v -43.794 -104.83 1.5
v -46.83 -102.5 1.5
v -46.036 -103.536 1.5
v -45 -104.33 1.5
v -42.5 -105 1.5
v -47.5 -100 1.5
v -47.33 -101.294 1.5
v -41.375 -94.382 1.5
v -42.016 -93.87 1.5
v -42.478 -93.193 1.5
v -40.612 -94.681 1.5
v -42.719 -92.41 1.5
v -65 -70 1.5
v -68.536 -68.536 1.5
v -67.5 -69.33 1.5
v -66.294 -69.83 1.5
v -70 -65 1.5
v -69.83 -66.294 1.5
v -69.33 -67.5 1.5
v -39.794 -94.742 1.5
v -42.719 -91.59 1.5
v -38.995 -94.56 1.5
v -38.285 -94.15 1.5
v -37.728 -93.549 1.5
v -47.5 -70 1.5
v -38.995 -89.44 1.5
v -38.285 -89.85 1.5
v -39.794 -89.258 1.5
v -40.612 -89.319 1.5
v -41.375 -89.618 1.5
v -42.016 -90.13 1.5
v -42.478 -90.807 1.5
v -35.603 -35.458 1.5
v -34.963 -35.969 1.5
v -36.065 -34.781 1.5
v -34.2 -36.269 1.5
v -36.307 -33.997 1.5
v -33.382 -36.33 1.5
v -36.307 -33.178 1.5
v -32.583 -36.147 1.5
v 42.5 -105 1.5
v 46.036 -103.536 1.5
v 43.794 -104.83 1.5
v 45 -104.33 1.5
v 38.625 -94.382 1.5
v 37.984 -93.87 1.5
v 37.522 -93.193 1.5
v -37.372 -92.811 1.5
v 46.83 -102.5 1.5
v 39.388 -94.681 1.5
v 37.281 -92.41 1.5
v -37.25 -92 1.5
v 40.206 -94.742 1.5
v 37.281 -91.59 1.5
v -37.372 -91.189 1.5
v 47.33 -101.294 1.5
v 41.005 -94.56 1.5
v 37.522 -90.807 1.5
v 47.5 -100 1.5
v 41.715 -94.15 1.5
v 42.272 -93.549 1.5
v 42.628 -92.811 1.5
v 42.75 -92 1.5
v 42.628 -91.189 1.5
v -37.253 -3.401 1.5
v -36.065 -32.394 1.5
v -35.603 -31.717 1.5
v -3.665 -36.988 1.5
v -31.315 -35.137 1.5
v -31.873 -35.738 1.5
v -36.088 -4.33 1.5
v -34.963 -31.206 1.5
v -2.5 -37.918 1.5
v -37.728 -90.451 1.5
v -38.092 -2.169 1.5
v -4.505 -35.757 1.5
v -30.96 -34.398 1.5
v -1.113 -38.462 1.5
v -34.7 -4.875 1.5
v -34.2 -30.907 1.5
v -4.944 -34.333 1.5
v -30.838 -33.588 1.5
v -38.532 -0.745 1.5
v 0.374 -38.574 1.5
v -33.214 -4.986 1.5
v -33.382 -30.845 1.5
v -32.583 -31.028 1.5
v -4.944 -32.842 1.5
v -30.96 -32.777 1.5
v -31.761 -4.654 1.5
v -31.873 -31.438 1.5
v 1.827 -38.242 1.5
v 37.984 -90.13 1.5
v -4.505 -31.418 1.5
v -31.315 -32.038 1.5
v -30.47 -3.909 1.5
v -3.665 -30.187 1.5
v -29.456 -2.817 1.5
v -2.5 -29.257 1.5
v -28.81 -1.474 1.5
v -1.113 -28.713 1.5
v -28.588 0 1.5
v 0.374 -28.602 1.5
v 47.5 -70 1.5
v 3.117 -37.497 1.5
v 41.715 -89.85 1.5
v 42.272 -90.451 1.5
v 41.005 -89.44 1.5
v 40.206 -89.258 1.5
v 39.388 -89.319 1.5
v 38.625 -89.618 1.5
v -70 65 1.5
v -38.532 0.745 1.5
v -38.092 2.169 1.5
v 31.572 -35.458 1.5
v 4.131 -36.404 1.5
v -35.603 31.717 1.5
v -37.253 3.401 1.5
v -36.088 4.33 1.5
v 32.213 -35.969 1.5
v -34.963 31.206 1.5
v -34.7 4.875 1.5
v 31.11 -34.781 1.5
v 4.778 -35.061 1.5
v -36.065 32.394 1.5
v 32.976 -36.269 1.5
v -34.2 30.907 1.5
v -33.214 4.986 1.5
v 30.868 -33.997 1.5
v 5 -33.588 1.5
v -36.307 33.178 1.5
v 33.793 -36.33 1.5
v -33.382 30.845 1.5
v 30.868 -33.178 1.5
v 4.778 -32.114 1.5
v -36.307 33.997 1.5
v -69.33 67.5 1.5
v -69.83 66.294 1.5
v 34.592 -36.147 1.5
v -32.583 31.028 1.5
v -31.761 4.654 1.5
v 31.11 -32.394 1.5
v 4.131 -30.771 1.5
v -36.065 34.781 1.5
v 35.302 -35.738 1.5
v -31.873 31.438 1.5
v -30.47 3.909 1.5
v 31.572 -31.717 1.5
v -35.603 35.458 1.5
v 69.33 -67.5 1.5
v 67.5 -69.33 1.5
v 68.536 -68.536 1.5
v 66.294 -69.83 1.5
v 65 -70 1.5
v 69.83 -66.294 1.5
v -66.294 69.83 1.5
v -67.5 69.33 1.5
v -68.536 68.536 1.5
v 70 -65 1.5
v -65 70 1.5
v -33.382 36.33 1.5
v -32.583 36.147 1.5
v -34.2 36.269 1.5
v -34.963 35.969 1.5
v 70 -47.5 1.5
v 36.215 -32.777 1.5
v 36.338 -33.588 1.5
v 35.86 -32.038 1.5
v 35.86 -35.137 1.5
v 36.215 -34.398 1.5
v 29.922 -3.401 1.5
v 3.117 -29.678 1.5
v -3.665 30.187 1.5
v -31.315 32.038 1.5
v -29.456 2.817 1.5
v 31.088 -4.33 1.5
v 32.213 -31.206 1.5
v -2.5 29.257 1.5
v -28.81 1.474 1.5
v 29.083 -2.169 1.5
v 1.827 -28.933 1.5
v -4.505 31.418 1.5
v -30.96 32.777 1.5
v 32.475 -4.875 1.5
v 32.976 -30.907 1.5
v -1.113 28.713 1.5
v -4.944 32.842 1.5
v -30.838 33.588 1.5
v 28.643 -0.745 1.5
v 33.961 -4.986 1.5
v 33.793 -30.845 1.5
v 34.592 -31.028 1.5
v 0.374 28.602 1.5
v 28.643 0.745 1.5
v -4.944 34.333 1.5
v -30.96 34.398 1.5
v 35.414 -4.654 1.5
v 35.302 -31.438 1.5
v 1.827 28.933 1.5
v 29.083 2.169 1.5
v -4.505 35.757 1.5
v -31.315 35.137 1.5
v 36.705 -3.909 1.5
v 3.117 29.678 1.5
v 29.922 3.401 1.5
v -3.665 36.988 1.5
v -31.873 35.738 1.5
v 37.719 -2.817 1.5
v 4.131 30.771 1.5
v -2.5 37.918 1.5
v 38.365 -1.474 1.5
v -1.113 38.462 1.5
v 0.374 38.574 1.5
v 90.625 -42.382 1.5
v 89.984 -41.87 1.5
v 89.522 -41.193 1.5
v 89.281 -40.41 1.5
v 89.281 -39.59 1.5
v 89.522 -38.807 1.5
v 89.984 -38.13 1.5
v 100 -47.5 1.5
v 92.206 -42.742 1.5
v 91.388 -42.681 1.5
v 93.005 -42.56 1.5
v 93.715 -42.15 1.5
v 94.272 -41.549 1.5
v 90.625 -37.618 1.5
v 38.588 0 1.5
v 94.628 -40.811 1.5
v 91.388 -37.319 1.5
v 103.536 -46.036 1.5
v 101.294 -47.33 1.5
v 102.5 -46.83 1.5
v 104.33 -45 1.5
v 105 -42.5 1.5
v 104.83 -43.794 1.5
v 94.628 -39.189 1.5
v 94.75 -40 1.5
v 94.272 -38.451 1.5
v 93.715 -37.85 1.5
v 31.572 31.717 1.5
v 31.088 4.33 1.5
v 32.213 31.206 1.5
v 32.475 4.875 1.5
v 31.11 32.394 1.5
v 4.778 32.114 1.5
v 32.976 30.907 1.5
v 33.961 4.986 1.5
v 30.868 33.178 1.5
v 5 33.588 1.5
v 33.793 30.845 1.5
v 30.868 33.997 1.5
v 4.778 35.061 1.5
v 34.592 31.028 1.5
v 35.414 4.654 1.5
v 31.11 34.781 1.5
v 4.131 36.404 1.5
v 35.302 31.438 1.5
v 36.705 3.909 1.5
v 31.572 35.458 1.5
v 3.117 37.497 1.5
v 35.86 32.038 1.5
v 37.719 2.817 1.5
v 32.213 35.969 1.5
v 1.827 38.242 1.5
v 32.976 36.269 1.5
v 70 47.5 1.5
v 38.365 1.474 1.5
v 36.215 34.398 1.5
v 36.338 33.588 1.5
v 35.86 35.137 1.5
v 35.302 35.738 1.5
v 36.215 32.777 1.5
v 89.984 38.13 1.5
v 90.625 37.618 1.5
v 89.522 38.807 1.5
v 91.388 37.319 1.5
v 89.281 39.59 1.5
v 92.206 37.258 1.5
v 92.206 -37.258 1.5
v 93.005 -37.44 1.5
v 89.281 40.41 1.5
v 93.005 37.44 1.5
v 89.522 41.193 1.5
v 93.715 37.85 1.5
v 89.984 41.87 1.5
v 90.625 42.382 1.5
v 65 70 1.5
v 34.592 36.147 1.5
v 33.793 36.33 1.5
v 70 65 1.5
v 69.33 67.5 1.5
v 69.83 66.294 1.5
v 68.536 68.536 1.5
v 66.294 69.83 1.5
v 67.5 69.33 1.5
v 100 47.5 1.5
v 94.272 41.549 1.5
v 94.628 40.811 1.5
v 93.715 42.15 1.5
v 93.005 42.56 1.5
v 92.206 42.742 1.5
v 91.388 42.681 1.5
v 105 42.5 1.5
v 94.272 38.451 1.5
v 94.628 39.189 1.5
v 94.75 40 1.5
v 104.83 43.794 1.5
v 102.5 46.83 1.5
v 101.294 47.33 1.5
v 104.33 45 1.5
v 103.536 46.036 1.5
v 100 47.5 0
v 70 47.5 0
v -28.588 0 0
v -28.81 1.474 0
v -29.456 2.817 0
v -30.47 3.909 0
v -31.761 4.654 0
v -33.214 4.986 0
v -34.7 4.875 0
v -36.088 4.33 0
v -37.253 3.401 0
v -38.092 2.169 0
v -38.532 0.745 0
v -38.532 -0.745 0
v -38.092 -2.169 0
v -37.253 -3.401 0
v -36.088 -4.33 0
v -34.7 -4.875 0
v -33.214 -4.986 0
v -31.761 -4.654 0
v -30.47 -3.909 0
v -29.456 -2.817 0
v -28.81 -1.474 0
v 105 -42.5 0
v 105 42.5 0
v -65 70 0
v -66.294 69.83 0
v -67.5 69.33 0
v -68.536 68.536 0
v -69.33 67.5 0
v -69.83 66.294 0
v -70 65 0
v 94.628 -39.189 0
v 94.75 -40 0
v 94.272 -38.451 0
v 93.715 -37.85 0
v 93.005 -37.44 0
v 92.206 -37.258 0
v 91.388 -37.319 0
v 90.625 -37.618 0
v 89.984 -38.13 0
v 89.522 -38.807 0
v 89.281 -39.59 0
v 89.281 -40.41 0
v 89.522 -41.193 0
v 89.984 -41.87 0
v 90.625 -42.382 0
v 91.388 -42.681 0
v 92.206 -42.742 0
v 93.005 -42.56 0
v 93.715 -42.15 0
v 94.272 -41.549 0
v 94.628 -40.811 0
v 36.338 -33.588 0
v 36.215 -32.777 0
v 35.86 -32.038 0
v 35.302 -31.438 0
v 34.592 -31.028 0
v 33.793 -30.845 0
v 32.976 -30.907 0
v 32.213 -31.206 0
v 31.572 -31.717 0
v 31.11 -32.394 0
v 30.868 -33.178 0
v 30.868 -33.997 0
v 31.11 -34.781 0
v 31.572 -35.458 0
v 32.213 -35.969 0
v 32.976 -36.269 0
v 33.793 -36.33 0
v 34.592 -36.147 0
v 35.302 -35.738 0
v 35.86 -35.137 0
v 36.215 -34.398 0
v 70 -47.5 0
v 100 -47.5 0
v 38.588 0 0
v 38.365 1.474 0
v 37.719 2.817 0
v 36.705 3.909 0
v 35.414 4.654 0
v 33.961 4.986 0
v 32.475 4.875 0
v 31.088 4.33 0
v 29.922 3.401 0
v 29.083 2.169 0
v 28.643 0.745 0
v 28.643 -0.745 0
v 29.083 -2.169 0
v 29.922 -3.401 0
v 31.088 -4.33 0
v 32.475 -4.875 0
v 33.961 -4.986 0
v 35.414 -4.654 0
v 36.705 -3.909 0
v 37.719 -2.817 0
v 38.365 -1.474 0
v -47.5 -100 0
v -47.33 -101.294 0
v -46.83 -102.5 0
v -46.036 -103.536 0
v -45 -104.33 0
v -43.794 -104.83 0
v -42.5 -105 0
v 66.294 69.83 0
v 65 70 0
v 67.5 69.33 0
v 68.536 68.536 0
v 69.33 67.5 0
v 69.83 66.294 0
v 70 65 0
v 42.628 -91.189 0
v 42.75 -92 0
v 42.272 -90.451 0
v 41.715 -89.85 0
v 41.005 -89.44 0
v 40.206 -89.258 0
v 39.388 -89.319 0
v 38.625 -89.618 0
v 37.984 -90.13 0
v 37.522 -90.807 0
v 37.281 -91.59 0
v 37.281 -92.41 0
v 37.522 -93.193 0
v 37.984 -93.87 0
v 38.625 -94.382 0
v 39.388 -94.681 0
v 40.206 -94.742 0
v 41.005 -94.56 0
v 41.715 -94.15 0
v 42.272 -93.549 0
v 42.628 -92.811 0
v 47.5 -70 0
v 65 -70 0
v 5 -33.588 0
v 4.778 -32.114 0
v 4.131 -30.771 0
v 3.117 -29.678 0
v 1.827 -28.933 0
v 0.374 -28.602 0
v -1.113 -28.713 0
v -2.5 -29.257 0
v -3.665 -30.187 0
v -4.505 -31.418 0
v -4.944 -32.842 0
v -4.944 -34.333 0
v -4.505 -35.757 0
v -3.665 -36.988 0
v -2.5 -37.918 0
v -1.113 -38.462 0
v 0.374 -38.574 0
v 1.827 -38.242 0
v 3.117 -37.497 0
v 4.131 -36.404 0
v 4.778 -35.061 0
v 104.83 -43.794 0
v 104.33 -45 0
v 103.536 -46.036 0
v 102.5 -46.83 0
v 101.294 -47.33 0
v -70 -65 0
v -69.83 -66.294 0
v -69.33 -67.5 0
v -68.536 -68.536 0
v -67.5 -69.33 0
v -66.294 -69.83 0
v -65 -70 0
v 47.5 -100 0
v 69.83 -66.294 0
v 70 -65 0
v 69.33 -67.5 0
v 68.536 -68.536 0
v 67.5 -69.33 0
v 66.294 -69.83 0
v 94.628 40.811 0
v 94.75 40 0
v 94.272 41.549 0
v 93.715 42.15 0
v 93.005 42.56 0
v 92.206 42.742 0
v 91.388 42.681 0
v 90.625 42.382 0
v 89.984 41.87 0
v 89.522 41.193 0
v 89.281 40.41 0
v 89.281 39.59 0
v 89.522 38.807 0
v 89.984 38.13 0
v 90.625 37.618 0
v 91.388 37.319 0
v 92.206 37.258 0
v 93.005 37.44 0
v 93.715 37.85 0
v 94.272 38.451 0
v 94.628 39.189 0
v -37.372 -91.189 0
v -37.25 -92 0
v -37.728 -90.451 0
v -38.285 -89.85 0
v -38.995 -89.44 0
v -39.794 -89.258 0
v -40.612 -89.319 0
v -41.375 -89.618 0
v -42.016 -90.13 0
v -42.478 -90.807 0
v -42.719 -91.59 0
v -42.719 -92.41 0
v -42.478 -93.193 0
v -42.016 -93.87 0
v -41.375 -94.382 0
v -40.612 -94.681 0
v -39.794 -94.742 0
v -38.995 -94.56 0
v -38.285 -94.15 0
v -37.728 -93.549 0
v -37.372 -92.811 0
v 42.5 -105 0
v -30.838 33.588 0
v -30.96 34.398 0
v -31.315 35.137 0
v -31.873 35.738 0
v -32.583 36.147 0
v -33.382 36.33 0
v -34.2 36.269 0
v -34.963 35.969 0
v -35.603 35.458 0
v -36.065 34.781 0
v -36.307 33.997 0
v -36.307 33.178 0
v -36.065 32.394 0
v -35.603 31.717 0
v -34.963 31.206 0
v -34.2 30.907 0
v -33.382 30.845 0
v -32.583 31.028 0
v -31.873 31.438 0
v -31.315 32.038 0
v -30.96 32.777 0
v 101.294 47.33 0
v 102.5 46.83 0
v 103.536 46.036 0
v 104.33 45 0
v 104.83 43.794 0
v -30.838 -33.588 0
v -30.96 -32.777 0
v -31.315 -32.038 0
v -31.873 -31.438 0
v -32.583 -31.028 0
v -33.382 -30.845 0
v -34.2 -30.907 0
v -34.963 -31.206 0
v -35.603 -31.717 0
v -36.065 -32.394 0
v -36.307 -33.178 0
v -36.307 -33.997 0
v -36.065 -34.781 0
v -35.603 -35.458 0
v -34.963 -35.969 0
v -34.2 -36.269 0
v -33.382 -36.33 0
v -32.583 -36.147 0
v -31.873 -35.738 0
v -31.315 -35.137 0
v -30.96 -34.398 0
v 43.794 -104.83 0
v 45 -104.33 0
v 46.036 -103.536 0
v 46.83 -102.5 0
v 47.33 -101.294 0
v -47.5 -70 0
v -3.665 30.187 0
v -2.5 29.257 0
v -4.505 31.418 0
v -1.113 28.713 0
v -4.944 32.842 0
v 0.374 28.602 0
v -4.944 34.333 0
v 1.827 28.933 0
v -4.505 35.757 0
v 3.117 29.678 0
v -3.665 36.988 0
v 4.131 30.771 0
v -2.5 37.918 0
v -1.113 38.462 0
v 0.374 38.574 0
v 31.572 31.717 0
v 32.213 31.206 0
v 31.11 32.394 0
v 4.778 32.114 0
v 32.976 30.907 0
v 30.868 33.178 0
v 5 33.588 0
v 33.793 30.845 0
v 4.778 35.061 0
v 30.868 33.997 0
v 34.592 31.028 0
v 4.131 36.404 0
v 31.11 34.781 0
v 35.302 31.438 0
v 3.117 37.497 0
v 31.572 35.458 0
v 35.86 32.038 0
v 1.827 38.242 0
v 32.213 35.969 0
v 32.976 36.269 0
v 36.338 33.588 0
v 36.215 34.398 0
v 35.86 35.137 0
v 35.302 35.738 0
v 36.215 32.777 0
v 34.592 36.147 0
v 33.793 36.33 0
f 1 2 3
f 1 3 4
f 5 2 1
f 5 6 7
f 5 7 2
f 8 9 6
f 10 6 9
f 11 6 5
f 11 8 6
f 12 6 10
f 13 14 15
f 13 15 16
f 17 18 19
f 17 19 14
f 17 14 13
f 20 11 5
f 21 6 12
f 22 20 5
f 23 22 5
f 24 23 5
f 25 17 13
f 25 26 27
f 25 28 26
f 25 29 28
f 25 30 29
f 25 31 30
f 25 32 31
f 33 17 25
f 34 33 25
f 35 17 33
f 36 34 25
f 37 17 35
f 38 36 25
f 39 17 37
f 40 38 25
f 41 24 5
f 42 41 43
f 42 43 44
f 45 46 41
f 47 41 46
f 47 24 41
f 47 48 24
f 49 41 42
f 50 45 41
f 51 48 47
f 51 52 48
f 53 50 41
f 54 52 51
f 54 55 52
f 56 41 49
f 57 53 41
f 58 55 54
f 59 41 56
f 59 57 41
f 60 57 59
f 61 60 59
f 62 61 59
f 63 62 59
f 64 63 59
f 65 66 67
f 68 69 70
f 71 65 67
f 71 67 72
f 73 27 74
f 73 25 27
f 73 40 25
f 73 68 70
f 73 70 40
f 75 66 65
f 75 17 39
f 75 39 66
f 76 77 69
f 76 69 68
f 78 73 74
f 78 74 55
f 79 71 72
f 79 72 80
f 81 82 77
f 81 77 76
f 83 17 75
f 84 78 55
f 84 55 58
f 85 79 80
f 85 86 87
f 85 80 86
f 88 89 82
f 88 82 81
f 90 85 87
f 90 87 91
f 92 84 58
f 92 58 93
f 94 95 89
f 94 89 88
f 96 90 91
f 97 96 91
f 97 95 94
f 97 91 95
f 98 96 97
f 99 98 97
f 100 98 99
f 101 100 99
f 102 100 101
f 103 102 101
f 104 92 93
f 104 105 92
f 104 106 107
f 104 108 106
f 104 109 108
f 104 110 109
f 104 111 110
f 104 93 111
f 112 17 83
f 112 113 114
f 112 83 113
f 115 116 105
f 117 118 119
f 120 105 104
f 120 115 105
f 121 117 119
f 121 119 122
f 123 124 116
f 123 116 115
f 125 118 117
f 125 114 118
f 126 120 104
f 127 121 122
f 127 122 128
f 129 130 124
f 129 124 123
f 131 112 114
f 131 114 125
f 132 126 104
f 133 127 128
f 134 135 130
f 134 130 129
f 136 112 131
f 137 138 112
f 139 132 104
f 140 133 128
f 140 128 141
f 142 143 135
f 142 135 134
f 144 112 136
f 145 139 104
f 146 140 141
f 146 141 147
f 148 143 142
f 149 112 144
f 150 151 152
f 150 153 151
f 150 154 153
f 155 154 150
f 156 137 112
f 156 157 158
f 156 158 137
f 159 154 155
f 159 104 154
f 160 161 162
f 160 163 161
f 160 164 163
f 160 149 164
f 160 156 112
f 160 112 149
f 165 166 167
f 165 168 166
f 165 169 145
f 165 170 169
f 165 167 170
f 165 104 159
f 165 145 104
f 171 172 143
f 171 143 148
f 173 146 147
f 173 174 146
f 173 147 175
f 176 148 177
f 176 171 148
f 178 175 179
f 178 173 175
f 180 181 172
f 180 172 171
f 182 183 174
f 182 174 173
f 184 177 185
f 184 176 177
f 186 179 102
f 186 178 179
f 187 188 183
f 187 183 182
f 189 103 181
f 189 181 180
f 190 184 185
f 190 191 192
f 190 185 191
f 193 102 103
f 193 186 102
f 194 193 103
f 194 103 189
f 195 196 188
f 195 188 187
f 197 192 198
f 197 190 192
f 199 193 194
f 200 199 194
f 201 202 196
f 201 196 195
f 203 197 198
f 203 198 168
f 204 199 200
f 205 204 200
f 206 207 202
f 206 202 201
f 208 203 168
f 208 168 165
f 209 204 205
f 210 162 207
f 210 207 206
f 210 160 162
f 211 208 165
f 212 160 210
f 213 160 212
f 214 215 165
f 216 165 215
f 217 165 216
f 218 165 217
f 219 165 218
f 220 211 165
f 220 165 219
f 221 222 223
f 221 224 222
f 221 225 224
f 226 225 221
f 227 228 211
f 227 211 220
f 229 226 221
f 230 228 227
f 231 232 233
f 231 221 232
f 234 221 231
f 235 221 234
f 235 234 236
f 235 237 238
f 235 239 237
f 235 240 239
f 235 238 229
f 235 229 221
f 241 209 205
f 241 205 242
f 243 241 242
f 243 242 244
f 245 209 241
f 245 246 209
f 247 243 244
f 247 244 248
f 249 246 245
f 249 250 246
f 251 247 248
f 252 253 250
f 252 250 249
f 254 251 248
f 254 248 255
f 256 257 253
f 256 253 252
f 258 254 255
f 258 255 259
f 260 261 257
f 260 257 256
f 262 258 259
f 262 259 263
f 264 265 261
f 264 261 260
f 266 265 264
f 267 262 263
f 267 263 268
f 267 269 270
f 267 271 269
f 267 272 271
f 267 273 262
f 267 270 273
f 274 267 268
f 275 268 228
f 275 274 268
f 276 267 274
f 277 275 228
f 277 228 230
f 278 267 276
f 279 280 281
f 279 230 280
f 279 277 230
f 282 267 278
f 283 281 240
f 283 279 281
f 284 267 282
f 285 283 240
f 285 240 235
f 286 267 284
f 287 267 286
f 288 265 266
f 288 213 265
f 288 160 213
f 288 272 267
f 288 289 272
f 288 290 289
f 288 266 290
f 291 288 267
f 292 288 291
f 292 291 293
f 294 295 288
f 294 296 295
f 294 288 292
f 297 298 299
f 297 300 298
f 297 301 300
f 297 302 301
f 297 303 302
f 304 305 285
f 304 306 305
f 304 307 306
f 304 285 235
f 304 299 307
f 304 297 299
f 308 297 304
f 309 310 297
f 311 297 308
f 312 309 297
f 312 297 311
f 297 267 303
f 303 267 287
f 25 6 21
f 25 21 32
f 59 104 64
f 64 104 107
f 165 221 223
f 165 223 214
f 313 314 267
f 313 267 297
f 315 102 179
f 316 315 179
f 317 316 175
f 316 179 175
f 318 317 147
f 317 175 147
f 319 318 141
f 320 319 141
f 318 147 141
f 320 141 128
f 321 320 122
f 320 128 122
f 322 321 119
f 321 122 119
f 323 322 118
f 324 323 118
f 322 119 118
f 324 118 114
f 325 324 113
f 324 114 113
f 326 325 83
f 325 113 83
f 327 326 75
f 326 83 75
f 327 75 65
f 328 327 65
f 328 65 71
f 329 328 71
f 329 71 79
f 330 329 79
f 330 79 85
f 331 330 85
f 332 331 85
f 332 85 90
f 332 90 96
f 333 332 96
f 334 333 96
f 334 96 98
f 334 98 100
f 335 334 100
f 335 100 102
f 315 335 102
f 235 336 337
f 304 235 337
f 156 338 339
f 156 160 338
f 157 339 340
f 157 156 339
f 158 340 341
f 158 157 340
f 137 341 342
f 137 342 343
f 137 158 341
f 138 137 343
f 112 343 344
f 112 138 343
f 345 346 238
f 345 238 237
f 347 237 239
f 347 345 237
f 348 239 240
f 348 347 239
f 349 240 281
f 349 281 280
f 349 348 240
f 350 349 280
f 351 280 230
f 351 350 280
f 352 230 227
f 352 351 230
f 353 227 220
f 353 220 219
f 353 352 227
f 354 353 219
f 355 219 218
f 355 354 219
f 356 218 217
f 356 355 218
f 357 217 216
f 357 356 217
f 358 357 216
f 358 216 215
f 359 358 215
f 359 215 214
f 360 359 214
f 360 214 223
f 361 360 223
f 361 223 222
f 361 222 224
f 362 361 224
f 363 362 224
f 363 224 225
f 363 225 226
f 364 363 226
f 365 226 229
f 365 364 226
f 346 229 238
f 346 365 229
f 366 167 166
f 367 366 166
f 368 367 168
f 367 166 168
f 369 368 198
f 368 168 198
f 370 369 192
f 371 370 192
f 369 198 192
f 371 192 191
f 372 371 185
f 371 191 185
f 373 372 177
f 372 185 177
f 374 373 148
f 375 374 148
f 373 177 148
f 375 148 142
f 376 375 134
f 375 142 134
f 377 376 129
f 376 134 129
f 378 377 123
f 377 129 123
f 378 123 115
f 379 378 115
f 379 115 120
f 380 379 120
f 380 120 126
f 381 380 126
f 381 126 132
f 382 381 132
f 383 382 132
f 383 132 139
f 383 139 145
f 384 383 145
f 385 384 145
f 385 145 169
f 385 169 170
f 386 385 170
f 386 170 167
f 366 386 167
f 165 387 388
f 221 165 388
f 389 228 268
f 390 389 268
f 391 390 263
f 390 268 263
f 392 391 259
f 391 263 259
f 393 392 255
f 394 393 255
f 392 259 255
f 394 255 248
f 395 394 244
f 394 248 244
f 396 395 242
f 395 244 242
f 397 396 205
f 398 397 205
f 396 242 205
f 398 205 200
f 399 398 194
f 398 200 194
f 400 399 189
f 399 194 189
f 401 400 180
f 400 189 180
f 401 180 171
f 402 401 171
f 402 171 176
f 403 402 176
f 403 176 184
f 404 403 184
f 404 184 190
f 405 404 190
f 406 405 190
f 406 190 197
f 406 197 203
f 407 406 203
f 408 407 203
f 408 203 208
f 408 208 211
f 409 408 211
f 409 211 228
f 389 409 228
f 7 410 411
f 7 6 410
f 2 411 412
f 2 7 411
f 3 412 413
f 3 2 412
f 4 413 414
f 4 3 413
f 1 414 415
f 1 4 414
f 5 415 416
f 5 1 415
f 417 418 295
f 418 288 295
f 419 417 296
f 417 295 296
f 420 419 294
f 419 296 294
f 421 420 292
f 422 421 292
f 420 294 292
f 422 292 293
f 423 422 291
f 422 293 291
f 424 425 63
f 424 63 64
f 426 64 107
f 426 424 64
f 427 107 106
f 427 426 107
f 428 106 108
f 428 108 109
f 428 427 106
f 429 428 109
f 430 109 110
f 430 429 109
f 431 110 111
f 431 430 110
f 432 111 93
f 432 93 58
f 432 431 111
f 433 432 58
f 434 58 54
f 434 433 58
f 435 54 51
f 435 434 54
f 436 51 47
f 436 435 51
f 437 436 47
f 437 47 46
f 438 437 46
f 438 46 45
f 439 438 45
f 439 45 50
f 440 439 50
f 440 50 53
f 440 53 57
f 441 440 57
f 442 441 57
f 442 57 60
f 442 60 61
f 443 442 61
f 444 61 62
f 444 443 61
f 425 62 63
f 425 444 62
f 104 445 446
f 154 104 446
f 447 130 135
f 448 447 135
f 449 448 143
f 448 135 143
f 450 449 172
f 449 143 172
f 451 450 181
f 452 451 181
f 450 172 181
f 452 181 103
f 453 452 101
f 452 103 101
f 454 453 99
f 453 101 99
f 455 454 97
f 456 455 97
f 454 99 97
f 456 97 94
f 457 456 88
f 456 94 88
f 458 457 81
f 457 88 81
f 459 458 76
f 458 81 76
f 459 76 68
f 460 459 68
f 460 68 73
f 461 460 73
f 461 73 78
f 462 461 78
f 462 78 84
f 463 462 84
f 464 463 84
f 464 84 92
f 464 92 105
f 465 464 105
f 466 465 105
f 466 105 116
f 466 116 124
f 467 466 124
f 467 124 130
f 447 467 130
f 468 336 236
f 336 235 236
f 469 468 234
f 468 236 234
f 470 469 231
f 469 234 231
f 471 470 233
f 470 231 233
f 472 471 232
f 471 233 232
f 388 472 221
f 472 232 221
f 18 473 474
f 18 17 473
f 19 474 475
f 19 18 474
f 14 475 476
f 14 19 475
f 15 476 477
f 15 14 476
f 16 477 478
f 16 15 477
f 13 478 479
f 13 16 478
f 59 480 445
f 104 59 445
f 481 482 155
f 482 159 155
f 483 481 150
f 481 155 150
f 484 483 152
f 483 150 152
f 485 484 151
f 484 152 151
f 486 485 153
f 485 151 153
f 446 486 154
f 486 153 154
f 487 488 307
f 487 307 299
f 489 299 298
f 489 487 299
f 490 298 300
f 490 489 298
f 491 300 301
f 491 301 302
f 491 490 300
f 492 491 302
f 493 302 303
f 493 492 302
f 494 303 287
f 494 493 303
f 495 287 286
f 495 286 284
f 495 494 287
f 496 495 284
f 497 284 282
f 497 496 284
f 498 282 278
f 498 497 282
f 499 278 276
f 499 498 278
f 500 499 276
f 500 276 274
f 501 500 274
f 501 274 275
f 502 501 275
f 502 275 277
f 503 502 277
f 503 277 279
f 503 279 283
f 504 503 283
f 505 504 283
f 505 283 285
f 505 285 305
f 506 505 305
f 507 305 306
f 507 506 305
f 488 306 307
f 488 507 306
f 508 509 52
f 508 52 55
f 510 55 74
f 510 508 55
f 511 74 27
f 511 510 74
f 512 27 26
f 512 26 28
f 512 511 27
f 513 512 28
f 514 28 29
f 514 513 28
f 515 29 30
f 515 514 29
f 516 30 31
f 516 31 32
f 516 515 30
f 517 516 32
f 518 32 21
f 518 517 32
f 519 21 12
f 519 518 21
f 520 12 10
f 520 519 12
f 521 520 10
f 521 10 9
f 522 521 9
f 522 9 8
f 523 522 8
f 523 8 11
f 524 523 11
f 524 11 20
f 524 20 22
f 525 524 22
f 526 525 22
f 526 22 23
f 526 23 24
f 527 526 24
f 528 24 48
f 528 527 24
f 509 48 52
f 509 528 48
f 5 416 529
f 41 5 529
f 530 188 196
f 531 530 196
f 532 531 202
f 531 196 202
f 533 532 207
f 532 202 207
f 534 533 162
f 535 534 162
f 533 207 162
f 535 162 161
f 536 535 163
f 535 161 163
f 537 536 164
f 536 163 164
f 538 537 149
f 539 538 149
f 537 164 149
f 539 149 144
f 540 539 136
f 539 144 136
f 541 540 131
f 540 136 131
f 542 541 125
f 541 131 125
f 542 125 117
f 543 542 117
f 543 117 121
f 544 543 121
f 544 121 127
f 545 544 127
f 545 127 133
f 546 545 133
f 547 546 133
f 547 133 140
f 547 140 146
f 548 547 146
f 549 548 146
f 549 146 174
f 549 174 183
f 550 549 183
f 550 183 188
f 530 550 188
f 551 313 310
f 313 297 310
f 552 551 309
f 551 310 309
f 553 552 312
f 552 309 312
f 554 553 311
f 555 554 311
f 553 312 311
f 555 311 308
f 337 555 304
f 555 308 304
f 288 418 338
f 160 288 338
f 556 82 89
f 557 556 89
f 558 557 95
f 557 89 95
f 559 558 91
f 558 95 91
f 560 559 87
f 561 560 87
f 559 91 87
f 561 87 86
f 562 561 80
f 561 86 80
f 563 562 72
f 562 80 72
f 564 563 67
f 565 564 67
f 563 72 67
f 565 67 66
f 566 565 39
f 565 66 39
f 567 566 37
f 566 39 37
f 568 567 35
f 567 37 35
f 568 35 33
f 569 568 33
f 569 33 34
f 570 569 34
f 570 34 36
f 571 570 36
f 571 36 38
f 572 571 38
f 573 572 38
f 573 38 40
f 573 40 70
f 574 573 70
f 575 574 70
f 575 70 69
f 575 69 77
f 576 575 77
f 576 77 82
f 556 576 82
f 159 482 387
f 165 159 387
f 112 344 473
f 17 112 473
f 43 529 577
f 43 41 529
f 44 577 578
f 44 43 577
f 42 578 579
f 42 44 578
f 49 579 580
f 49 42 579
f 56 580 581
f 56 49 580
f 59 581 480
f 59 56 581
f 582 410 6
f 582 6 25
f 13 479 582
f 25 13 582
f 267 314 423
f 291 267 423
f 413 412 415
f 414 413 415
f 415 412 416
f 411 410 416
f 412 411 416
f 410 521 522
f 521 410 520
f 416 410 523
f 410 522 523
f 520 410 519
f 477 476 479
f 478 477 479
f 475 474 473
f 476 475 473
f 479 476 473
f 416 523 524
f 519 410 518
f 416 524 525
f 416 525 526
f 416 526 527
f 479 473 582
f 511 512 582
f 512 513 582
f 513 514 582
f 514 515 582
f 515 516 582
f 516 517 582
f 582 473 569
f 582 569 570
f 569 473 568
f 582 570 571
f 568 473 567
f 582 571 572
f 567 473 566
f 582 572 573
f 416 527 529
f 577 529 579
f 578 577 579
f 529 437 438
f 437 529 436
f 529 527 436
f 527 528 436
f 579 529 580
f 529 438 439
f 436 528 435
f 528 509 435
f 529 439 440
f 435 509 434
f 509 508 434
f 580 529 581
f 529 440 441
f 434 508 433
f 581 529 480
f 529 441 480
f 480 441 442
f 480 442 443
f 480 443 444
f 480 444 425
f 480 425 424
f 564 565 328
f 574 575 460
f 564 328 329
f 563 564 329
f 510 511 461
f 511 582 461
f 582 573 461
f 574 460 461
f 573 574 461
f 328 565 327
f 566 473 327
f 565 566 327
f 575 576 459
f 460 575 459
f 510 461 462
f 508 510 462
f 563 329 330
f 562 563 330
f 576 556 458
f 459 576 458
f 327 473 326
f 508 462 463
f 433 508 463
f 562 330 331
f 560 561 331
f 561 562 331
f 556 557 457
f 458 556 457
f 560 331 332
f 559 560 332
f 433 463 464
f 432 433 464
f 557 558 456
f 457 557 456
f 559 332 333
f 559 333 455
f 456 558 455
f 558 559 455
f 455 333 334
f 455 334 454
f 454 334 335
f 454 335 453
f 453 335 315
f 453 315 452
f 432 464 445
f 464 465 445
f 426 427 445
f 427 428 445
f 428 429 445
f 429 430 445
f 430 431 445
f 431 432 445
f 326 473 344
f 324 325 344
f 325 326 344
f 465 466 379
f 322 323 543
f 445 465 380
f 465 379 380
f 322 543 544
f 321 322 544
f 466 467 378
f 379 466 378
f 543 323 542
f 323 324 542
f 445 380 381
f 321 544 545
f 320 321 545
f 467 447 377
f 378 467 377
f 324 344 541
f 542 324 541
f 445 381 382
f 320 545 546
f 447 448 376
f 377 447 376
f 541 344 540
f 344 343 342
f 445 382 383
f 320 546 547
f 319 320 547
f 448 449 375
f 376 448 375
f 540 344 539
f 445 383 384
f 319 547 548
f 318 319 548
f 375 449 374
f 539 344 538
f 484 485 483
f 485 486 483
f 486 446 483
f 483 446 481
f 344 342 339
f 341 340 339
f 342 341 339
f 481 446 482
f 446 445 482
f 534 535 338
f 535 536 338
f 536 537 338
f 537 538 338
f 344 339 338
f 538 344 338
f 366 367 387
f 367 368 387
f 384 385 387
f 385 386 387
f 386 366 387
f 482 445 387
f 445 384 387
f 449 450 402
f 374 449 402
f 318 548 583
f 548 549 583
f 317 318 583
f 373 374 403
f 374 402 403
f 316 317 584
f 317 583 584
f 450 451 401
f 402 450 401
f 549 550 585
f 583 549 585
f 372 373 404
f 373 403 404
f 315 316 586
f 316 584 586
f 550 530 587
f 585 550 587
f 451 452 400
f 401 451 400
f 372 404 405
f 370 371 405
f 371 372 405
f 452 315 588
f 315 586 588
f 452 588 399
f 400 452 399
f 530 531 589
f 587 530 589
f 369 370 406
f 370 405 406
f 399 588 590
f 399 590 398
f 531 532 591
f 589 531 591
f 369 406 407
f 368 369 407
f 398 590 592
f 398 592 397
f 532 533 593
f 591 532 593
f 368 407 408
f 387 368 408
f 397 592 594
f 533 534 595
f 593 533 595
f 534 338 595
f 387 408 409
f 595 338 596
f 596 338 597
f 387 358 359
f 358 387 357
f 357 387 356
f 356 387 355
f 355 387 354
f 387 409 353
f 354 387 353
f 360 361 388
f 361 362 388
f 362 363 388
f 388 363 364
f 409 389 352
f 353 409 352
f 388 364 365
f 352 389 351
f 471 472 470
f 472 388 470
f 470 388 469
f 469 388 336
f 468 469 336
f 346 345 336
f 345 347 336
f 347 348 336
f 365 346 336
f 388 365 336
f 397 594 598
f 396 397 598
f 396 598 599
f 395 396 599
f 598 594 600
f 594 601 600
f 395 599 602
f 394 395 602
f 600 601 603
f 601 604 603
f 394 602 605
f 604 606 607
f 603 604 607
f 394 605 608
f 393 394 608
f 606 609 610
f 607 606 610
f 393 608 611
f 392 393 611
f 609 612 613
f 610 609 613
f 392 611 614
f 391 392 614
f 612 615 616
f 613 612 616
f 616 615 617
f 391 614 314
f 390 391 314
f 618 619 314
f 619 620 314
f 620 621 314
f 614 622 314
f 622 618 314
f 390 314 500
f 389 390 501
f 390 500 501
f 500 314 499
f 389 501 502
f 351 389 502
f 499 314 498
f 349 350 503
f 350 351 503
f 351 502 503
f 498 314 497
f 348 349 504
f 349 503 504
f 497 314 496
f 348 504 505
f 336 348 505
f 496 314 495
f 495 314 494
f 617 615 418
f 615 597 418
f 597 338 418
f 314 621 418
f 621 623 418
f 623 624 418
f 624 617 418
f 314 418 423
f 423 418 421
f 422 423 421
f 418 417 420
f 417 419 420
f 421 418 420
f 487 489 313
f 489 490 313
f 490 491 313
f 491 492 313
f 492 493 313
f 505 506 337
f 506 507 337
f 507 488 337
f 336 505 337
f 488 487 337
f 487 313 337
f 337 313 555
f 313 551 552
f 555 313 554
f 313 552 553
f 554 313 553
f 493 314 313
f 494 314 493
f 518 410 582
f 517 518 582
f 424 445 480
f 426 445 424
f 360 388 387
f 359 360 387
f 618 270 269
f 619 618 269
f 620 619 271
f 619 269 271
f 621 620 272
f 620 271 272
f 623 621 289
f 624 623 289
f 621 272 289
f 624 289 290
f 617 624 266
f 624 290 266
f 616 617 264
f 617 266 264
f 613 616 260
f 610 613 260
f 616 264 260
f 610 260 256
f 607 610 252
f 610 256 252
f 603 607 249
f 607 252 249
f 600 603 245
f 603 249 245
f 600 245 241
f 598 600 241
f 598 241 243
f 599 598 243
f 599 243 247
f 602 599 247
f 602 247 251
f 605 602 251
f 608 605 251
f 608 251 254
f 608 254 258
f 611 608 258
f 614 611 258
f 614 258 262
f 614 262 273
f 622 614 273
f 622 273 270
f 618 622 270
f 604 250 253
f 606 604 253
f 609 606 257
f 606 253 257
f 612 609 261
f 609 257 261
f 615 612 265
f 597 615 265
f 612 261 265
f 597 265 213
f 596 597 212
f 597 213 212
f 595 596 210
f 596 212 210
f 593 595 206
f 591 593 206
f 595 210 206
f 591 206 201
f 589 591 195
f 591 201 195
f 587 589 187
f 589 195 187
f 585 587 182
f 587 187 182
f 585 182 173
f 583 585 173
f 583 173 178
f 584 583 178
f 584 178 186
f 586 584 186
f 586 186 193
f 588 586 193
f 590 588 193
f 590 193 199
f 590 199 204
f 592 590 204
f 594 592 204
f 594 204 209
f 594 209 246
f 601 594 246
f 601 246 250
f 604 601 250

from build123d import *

# Parameters (mm, degrees)
F0_W     = 35
F0_H     = 95
F0_R     = 2.75
F0_W_2   = 95
F0_H_2   = 35
F1_DEPTH = 1.5
F2_R     = 2.75
F2_R_2   = 5
F3_DEPTH = 1.501
F4_R     = 5
F5_R     = 5


with BuildPart() as f1:
    # F0 (on Top) → F1 (new body)
    with BuildSketch(Plane.XY):
        Polygon((70, 70), (-70, 70), (-70, -70), (-47.5, -70), (47.5, -70), (70, -70), (70, -47.5), (70, 47.5), align=None)
        with Locations((87.5, 0)):
            Rectangle(F0_W, F0_H)
        with Locations((92, -40)):
            Circle(F0_R, mode=Mode.SUBTRACT)
        with Locations((92, 40)):
            Circle(F0_R, mode=Mode.SUBTRACT)
        with Locations((0, -87.5)):
            Rectangle(F0_W_2, F0_H_2)
        with Locations((-40, -92)):
            Circle(F0_R, mode=Mode.SUBTRACT)
        with Locations((40, -92)):
            Circle(F0_R, mode=Mode.SUBTRACT)
    extrude(amount=F1_DEPTH)

    # F2 (on face) → F3 (cut, through all)
    with BuildSketch(Plane.XY.offset(1.5)):
        with Locations((-33.587572, -33.587572)):
            Circle(F2_R)
        with Locations((33.587572, -33.587572)):
            Circle(F2_R)
        with Locations((-33.587572, 33.587572)):
            Circle(F2_R)
        with Locations((33.587572, 33.587572)):
            Circle(F2_R)
        with Locations((0, -33.587572)):
            Circle(F2_R_2)
        with Locations((33.587572, 0)):
            Circle(F2_R_2)
        with Locations((-33.587572, 0)):
            Circle(F2_R_2)
        with Locations((0, 33.587572)):
            Circle(F2_R_2)
    extrude(amount=-F3_DEPTH, mode=Mode.SUBTRACT)

    # F4
    f4_edges = [f1.edges().sort_by_distance(p)[0] for p in [
        (70, -70, 0.75),
        (-70, -70, 0.75),
        (70, 70, 0.75),
        (-70, 70, 0.75),
    ]]
    fillet(f4_edges, radius=F4_R)

    # F5
    f5_edges = [f1.edges().sort_by_distance(p)[0] for p in [
        (-47.5, -105, 0.75),
        (47.5, -105, 0.75),
        (105, -47.5, 0.75),
        (105, 47.5, 0.75),
    ]]
    fillet(f5_edges, radius=F5_R)


solid = f1.part
